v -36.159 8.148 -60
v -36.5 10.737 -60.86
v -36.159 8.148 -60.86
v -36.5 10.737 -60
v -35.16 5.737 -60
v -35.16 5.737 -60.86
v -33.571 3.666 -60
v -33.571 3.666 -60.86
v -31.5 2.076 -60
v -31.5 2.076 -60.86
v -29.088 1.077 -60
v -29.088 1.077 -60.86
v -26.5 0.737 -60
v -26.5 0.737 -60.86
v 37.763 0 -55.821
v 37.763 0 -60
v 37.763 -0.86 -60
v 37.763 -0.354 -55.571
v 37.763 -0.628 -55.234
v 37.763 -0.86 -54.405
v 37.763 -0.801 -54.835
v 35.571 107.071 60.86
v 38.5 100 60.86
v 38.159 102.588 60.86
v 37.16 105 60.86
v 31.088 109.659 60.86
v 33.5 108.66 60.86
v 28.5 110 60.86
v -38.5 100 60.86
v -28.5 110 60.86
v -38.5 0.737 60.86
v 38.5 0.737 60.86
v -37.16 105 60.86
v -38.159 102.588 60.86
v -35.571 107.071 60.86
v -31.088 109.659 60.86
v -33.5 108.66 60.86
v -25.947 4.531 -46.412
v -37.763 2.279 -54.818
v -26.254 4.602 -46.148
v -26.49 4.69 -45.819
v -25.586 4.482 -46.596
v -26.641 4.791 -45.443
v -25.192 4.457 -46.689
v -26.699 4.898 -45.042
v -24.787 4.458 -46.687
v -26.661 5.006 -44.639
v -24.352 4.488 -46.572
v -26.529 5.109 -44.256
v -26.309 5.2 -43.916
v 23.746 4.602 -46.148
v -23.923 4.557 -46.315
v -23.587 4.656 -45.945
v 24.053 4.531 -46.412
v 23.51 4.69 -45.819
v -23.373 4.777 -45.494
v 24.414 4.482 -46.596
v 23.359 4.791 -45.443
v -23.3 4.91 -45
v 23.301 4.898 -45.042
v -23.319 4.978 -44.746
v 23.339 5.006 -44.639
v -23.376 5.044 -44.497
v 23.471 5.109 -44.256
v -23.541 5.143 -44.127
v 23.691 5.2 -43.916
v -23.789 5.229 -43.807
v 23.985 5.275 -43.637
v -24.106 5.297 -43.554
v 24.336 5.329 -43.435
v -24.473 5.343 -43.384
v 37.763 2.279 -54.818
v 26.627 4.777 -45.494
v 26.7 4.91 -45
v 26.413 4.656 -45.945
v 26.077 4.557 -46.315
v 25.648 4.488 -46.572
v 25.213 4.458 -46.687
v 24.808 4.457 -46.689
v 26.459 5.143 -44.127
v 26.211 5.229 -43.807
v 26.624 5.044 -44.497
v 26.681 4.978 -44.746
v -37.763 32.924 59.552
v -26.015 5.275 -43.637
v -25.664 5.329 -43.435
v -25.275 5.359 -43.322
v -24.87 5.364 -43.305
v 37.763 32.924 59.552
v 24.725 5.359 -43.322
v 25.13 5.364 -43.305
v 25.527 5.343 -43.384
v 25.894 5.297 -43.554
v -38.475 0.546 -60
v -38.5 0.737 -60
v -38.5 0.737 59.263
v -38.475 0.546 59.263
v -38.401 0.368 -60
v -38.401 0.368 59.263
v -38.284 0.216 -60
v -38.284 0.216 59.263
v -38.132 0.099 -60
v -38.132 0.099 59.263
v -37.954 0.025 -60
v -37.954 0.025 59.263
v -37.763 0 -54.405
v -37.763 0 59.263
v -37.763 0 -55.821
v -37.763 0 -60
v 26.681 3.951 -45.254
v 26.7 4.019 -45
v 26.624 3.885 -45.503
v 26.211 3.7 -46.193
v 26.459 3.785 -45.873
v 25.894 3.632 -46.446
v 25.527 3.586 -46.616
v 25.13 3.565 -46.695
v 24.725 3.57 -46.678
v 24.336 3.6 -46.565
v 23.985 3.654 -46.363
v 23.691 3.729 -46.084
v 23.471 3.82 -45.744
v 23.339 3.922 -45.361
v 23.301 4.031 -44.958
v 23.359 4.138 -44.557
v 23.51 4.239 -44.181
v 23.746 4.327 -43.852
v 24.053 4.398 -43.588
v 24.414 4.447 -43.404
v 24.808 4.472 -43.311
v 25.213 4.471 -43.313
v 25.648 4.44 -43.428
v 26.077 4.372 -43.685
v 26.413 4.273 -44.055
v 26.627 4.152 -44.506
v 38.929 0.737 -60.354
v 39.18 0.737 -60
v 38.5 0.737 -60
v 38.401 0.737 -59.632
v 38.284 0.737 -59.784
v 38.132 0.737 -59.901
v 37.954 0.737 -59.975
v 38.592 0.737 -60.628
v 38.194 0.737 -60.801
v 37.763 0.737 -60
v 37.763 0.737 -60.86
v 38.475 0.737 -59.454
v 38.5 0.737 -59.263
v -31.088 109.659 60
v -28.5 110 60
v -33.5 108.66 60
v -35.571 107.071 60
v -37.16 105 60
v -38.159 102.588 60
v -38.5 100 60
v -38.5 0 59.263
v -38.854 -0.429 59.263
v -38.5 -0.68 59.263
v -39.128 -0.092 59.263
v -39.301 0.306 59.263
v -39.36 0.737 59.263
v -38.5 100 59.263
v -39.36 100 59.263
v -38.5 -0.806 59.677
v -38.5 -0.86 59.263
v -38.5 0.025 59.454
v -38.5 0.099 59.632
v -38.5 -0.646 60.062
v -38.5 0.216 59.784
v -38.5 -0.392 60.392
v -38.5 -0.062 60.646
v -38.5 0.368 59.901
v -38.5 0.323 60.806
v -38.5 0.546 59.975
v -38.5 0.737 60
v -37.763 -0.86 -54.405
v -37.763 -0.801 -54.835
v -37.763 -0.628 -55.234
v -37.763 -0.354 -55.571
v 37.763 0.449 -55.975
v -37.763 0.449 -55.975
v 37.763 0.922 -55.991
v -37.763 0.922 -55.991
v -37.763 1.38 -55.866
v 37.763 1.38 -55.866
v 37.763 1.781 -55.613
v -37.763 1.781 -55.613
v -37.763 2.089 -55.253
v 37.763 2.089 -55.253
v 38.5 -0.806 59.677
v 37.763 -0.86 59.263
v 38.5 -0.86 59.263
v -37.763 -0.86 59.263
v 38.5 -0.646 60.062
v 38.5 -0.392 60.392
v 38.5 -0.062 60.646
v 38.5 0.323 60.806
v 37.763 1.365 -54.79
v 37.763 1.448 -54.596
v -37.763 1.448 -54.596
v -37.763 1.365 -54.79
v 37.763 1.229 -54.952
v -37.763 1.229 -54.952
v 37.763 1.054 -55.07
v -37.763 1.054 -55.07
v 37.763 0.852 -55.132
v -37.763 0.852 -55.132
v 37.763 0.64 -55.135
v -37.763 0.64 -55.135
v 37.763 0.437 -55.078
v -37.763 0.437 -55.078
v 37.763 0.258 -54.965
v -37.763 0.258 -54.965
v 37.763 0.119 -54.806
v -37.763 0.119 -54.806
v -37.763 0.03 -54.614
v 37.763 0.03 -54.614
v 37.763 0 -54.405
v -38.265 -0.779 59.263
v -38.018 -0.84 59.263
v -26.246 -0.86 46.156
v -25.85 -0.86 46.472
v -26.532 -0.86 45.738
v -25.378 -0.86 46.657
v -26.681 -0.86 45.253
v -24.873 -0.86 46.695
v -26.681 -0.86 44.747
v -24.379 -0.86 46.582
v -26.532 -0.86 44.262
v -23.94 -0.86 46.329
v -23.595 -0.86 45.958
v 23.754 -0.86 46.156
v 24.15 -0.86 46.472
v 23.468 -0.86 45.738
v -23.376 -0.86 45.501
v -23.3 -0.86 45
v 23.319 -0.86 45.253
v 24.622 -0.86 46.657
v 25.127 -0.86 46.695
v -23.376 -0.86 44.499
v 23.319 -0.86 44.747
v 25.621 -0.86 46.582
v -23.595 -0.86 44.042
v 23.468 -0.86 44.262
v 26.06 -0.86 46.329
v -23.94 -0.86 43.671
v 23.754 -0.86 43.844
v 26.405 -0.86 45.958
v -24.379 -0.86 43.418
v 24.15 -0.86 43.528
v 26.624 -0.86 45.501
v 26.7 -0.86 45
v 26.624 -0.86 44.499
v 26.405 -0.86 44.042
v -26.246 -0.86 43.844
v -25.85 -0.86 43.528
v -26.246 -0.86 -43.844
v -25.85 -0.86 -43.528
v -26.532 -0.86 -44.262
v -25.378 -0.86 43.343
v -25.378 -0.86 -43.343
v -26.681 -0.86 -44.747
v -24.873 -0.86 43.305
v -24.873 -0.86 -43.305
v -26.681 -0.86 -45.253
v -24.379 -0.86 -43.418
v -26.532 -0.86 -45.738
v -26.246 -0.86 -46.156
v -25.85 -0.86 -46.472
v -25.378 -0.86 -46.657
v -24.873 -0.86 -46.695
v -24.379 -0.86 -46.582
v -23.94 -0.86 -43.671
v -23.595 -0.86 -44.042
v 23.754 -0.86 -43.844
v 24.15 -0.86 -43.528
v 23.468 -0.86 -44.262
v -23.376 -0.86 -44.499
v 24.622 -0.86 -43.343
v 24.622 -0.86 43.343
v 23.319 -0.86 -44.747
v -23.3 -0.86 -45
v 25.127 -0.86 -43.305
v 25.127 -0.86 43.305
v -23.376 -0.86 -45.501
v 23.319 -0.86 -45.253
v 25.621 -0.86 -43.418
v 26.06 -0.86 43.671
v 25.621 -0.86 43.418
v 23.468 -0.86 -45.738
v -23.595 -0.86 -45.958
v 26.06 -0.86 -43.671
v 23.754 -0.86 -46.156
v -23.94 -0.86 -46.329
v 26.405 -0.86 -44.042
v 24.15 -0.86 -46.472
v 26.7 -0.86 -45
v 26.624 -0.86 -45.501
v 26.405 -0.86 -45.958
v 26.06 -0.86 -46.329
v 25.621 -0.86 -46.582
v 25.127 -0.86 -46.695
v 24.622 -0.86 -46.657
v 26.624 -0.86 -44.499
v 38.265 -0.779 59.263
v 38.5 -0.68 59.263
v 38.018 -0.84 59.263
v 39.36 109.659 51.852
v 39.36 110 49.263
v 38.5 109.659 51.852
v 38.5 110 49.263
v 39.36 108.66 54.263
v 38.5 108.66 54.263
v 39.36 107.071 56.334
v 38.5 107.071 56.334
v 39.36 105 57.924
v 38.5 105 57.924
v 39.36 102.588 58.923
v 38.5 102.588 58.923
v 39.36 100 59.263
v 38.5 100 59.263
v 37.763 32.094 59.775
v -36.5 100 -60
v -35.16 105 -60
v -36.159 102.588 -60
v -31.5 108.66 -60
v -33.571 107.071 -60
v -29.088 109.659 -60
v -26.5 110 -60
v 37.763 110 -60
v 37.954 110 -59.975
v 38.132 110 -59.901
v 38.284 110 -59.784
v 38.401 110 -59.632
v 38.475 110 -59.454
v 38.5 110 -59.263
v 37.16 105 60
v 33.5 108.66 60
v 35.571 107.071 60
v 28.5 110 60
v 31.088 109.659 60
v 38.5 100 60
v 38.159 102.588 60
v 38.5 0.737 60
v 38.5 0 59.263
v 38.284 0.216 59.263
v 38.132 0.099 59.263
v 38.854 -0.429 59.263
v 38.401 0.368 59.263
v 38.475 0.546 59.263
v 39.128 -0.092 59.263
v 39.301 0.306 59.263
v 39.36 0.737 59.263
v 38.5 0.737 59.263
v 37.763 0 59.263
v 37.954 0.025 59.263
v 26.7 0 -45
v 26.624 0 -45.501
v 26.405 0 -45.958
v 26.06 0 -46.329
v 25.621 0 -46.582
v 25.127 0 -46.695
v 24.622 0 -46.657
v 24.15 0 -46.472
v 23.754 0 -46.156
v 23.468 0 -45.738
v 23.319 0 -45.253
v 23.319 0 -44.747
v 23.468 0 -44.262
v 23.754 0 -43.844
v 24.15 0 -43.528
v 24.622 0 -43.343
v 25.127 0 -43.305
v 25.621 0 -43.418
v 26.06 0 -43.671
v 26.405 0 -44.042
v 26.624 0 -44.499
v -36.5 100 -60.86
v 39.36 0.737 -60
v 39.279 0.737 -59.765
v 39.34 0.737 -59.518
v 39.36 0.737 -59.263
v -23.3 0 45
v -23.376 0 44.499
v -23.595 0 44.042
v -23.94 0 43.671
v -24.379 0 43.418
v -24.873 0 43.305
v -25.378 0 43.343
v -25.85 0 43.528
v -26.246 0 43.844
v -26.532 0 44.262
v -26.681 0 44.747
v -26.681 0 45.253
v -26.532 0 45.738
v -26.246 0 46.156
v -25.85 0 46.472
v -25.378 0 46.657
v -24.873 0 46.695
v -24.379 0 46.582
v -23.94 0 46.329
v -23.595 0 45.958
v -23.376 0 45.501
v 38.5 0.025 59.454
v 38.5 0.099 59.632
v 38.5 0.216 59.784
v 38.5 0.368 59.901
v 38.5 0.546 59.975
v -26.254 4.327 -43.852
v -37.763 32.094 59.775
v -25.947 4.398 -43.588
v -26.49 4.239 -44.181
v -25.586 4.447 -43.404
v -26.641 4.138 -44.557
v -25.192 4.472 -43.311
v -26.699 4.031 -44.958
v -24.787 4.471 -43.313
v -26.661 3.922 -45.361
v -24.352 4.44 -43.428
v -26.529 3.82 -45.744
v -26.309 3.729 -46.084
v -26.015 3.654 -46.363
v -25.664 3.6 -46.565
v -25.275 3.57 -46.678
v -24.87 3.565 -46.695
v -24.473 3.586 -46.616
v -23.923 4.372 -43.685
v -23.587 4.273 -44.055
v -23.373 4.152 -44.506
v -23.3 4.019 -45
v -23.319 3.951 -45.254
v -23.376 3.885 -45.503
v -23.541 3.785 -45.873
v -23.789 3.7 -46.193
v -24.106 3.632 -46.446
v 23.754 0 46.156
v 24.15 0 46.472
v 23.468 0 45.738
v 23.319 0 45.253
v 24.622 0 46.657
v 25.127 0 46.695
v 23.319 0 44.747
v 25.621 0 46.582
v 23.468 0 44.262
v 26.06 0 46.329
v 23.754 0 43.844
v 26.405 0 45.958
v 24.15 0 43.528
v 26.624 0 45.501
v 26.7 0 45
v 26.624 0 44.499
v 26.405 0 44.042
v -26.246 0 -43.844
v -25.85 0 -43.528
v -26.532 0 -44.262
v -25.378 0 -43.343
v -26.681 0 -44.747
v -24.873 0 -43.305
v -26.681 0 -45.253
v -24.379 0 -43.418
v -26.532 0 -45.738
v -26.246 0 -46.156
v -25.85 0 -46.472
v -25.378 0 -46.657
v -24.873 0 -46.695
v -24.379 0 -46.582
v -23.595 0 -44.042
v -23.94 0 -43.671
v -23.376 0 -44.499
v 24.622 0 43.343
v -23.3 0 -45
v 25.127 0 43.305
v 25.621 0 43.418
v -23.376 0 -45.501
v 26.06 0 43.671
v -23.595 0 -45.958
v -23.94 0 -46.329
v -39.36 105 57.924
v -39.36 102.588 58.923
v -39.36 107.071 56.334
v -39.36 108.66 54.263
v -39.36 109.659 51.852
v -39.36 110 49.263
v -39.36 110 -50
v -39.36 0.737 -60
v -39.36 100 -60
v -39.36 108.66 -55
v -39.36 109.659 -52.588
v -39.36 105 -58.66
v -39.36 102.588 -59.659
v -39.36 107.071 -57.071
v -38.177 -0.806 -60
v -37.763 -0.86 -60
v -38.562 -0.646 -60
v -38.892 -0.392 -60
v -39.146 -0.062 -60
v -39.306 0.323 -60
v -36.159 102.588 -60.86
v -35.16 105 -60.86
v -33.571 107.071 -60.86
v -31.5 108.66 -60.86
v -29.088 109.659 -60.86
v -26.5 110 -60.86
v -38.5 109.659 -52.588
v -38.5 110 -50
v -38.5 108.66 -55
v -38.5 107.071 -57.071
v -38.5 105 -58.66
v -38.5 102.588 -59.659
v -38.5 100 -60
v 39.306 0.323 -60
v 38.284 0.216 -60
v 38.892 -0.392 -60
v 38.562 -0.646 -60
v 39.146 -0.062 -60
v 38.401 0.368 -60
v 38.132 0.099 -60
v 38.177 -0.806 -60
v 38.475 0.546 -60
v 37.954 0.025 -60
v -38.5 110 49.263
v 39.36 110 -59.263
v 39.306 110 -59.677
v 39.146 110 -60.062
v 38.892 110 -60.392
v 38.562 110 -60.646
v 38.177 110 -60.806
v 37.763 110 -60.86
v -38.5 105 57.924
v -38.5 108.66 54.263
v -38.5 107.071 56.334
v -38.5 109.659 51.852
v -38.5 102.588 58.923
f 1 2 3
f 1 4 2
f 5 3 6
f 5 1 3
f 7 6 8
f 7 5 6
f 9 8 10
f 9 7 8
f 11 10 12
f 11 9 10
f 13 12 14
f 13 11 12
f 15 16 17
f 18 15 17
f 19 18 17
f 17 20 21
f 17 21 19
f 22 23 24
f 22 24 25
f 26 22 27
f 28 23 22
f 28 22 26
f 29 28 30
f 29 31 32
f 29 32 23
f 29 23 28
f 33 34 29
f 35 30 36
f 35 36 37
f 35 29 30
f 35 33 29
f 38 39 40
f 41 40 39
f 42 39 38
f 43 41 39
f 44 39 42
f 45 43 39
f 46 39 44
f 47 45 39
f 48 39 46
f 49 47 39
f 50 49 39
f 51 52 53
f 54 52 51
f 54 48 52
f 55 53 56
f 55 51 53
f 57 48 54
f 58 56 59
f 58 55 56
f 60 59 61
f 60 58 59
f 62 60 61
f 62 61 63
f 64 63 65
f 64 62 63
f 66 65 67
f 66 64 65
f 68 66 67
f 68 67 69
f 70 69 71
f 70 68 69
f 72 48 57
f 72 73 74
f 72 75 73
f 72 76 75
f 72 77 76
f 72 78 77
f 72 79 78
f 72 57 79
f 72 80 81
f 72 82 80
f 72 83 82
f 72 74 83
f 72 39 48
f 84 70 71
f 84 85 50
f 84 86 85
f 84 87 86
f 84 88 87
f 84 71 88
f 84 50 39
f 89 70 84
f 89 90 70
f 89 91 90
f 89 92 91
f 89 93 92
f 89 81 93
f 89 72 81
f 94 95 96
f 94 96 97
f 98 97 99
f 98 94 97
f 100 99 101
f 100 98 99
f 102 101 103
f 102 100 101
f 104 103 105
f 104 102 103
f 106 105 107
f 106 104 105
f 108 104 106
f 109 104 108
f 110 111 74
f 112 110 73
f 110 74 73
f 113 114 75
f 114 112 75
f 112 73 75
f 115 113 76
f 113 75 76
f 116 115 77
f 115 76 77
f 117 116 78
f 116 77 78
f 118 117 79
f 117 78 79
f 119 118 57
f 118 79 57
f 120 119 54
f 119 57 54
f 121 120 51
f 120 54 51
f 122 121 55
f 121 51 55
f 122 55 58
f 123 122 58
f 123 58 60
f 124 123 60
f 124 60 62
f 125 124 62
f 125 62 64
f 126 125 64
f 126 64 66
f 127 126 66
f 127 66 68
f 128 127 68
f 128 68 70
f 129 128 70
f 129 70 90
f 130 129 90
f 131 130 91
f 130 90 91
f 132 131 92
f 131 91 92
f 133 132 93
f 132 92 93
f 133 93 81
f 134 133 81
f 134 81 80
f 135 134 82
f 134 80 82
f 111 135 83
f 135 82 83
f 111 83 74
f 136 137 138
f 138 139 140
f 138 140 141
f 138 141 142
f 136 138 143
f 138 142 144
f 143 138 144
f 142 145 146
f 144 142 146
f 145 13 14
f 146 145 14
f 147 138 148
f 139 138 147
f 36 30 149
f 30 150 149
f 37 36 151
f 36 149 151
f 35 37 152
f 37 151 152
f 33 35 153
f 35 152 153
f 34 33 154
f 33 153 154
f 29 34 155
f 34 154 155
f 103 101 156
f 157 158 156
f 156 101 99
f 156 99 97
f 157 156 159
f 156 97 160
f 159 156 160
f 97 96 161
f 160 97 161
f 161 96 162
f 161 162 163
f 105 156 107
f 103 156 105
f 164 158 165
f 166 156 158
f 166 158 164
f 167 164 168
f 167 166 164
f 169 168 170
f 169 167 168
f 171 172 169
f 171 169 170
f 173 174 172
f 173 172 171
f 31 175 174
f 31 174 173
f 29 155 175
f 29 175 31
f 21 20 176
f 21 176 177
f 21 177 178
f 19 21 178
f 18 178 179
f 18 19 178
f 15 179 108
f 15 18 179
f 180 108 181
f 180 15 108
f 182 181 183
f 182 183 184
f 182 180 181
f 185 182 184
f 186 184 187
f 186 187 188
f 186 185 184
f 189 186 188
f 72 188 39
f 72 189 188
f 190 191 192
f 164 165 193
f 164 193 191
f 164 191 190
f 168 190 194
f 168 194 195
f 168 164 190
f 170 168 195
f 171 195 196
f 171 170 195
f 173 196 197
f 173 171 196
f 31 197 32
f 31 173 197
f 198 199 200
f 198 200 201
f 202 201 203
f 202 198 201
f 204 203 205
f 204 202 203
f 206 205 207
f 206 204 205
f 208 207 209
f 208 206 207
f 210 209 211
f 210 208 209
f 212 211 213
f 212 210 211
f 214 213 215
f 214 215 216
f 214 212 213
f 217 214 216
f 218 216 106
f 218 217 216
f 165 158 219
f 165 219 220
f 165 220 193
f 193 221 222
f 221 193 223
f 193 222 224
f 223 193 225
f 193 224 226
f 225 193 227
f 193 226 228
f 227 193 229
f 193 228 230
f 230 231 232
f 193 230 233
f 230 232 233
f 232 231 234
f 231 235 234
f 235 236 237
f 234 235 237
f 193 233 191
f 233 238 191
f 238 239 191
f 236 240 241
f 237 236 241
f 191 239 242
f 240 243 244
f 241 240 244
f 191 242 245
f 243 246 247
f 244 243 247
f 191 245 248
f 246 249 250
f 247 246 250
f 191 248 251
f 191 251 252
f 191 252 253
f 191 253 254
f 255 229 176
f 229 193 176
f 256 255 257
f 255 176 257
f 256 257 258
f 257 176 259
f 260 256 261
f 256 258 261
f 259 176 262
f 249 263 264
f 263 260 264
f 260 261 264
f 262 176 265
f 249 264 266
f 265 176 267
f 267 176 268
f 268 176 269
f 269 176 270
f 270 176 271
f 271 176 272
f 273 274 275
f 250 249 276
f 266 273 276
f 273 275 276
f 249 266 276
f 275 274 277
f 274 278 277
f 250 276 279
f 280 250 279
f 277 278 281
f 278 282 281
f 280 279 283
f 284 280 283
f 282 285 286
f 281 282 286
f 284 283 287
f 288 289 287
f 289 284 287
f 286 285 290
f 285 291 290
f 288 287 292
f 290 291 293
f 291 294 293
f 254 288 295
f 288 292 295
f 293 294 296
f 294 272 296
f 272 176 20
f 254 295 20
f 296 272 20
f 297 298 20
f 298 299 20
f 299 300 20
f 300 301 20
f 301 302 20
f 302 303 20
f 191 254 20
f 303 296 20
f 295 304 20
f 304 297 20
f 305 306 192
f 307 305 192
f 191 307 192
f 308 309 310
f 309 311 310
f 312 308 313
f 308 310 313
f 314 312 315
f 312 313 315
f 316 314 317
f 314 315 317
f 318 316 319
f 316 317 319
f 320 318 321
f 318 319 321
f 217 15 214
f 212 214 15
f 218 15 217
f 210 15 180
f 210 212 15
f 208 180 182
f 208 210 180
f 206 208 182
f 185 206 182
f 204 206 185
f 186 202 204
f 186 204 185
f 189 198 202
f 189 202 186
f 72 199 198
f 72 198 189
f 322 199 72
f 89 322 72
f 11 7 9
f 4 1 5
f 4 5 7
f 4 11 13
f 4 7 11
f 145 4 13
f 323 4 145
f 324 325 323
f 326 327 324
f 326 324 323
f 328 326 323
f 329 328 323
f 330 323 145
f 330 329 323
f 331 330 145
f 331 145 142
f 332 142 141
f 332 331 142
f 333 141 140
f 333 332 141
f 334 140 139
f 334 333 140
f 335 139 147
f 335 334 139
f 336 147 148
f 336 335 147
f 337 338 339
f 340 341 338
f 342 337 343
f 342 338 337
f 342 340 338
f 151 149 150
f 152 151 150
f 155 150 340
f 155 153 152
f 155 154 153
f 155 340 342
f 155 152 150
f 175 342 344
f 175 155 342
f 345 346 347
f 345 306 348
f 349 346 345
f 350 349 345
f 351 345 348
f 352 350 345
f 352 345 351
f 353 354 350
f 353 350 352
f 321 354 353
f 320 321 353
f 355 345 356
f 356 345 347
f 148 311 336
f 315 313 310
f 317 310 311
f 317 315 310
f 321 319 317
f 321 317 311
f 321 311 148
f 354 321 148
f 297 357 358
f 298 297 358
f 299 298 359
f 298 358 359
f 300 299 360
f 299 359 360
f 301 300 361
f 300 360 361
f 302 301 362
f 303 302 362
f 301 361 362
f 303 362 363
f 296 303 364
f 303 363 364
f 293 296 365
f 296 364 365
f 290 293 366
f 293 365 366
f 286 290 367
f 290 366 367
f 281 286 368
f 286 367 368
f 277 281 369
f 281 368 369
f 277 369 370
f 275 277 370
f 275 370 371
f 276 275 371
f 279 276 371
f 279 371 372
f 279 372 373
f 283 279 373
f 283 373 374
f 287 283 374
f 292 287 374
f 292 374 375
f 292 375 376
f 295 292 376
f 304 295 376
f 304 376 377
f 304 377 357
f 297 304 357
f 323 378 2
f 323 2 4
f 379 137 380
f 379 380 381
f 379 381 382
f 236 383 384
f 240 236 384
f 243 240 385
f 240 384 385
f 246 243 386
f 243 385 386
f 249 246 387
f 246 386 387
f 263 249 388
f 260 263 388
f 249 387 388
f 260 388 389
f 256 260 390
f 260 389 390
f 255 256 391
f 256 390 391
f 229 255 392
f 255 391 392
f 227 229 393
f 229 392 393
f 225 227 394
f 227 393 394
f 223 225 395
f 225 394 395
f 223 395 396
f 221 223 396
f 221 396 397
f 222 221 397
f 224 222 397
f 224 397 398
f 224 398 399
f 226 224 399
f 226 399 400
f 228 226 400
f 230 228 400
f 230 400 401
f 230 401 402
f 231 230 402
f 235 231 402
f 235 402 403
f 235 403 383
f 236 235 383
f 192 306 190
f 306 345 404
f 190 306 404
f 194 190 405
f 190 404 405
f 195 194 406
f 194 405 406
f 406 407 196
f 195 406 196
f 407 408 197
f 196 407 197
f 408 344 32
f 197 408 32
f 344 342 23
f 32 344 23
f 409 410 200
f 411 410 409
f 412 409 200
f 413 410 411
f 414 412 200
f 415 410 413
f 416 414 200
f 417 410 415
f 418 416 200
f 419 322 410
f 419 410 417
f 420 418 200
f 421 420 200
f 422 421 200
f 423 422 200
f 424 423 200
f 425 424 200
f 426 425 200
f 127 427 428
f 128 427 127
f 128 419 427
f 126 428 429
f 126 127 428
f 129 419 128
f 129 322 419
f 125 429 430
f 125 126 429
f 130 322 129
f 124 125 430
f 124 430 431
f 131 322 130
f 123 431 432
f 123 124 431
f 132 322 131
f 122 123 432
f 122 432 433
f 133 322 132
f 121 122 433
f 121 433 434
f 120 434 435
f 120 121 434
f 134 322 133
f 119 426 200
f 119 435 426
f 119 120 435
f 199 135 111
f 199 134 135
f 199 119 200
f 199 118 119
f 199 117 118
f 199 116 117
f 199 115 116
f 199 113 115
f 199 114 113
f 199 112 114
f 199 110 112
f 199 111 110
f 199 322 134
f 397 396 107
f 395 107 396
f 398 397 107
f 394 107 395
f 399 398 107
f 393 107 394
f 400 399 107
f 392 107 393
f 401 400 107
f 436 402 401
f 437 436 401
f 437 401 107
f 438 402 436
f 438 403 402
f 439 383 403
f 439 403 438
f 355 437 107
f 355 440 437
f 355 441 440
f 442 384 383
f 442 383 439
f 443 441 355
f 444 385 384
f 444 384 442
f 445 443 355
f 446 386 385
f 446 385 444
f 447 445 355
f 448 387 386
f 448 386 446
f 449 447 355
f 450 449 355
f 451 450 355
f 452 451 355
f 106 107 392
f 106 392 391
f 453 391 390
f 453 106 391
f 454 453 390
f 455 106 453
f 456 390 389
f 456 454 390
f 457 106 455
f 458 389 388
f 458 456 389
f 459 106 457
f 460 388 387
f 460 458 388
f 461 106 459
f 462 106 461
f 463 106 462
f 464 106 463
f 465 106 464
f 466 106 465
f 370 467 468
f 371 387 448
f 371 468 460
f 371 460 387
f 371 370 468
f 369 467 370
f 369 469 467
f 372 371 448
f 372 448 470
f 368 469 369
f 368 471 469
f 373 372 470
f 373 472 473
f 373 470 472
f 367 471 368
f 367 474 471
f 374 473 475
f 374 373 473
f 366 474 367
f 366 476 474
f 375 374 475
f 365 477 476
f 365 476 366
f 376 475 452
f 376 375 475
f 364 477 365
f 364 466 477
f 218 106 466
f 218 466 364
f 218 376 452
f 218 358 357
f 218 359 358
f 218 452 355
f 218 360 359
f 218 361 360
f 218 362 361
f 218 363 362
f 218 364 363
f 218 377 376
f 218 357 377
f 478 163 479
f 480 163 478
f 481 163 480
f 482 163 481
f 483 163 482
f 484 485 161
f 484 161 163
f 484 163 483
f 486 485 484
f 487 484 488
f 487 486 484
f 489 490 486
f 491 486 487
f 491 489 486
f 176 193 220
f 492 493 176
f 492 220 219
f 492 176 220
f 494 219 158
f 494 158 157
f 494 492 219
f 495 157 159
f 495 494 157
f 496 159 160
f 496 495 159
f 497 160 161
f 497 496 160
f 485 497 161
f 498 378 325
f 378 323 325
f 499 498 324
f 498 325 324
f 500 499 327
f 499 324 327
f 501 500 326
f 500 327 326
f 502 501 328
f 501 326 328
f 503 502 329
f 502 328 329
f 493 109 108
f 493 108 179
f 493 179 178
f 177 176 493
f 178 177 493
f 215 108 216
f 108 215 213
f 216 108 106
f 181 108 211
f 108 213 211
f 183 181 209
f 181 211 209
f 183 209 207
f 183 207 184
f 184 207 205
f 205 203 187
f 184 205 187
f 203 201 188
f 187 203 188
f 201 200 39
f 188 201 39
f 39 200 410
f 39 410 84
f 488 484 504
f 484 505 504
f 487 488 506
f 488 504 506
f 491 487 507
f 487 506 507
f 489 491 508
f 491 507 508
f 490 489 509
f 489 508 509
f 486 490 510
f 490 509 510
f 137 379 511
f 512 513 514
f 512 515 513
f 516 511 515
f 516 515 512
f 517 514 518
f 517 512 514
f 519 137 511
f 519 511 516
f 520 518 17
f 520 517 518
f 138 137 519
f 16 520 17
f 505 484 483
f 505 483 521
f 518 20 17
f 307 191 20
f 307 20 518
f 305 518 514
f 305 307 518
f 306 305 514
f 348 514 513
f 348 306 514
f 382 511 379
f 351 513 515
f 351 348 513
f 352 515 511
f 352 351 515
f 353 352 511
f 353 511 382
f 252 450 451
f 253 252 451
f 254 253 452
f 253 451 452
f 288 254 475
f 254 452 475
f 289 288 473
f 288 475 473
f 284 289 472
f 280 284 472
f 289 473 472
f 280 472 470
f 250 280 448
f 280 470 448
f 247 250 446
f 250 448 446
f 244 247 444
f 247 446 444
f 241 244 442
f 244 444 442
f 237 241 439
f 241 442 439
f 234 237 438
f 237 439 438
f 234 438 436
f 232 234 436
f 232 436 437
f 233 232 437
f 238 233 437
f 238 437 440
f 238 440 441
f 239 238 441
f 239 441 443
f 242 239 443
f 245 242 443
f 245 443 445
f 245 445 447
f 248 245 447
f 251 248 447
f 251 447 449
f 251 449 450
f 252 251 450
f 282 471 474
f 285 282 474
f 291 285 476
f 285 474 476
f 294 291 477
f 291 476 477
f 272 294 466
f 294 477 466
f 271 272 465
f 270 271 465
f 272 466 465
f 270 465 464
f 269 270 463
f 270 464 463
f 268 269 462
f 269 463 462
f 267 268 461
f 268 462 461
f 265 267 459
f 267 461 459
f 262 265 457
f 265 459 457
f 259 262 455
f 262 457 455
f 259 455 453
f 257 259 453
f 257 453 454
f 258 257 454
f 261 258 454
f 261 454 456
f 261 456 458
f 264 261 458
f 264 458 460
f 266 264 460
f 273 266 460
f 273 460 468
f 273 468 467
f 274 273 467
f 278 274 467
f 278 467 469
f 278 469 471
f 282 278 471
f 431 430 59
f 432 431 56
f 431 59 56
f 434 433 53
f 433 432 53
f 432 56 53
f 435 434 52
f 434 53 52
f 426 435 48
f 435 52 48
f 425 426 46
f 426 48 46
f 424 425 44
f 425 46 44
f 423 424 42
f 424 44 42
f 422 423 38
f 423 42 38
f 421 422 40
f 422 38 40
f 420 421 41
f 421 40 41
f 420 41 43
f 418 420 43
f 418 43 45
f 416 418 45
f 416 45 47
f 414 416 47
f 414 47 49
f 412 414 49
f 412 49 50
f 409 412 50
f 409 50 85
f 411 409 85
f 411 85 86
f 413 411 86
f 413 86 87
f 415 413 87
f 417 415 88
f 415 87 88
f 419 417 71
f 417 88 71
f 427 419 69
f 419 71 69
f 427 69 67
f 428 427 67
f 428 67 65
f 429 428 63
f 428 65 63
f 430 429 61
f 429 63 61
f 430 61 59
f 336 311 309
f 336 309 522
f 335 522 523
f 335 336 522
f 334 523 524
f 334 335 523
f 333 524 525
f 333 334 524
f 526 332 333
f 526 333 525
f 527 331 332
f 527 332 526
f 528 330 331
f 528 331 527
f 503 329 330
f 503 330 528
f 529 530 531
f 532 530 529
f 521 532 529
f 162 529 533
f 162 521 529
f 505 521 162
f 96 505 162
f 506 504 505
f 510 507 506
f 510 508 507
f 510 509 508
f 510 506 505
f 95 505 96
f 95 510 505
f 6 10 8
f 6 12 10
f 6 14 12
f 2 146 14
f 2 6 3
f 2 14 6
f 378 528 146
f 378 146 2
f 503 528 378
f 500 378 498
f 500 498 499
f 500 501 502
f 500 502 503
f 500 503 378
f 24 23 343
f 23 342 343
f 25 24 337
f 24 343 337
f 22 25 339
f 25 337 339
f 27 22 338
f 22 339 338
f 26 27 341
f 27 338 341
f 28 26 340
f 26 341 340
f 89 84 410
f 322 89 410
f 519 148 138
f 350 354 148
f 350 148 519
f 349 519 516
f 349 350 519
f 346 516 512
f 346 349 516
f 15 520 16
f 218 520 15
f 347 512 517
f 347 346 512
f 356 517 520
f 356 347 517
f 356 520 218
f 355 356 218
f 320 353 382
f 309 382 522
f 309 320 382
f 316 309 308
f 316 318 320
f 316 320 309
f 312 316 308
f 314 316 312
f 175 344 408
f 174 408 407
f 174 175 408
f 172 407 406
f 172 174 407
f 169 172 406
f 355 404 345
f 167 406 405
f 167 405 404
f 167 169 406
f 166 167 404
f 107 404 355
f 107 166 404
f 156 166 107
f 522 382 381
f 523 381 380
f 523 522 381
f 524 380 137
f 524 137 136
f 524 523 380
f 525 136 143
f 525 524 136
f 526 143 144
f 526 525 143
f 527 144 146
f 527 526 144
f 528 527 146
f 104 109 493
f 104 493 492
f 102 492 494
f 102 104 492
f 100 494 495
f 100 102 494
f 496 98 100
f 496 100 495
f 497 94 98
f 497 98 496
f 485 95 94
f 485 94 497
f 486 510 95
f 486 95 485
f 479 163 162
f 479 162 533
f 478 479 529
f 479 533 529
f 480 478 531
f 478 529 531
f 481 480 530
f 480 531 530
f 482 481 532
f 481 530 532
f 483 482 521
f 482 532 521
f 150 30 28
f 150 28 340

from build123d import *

# Parameters (mm, degrees)
SKETCH1_W                    = 77
SKETCH1_H                    = 120
BASE_FLANGE1_DEPTH           = 0.86
EDGE_FLANGE1_STRIP_W         = 4.9132
EDGE_FLANGE1_STRIP_H         = 0.86
EDGE_FLANGE1_STRIP_CUT_DEPTH = 77
EDGE_FLANGE1_DEPTH           = 77
EDGE_FLANGE2_STRIP_W         = 4.9132
EDGE_FLANGE2_STRIP_H         = 0.86
EDGE_FLANGE2_STRIP_CUT_DEPTH = 119.2634
EDGE_FLANGE2_DEPTH           = 119.2634
EDGE_FLANGE3_STRIP_W         = 4.9132
EDGE_FLANGE3_STRIP_H         = 0.86
EDGE_FLANGE3_STRIP_CUT_DEPTH = 119.2634
EDGE_FLANGE3_DEPTH           = 119.2634
EDGE_FLANGE4_STRIP_CUT_DEPTH = 75.5268
EDGE_FLANGE4_DEPTH           = 75.5268
EDGE_FLANGE8_STRIP_W         = 4.9132
EDGE_FLANGE8_STRIP_H         = 0.86
EDGE_FLANGE8_STRIP_CUT_DEPTH = 109.2634
EDGE_FLANGE8_DEPTH           = 109.2634
M3_CLEARANCE_HOLE3_D         = 3.4
M3_CLEARANCE_HOLE3_DEPTH     = 25.4
M3_CLEARANCE_HOLE3_TIP       = 1.021463052
FILLET1_R                    = 10


# Sheet-metal steps are written as plain solids
with BuildPart() as part:
    # Sketch1 → Base-Flange1 (new body)
    with BuildSketch(Plane(origin=(0, 0, 0), x_dir=(1, 0, 0), z_dir=(0, 1, 0))):
        Rectangle(SKETCH1_W, SKETCH1_H)
    extrude(amount=-BASE_FLANGE1_DEPTH)

    # Edge-Flange1 strip (across the edge) → Edge-Flange1 strip cut (cut)
    with BuildSketch(Plane(origin=(-38.5, 0, 60), x_dir=(0, 0, -1), z_dir=(1, 0, 0))):
        with Locations((-1.72, -0.43)):
            Rectangle(EDGE_FLANGE1_STRIP_W, EDGE_FLANGE1_STRIP_H)
    extrude(amount=EDGE_FLANGE1_STRIP_CUT_DEPTH, mode=Mode.SUBTRACT)

    # Edge-Flange1 section (across the edge) → Edge-Flange1 (add)
    with BuildSketch(Plane(origin=(-38.5, 0, 60), x_dir=(0, 0, -1), z_dir=(1, 0, 0))):
        with BuildLine():
            Line((-0.86, 0.7366), (-0.86, 110))
            Line((-0.86, 110), (0, 110))
            Line((0, 110), (0, 0.7366))
            ThreePointArc((0, 0.7366), (0.215745145, 0.215745145), (0.7366, 0))
            Line((0.7366, 0), (0.7366, -0.86))
            ThreePointArc((0.7366, -0.86), (-0.392366687, -0.392366687), (-0.86, 0.7366))
        make_face()
    extrude(amount=EDGE_FLANGE1_DEPTH)

    # Edge-Flange2 strip (across the edge) → Edge-Flange2 strip cut (cut)
    with BuildSketch(Plane(origin=(38.5, 0, 59.2634), x_dir=(-1, 0, 0), z_dir=(0, 0, -1))):
        with Locations((-1.72, -0.43)):
            Rectangle(EDGE_FLANGE2_STRIP_W, EDGE_FLANGE2_STRIP_H)
    extrude(amount=EDGE_FLANGE2_STRIP_CUT_DEPTH, mode=Mode.SUBTRACT)

    # Edge-Flange2 section (across the edge) → Edge-Flange2 (add)
    with BuildSketch(Plane(origin=(38.5, 0, 59.2634), x_dir=(-1, 0, 0), z_dir=(0, 0, -1))):
        with BuildLine():
            Line((-0.86, 0.7366), (-0.86, 110))
            Line((-0.86, 110), (0, 110))
            Line((0, 110), (0, 0.7366))
            ThreePointArc((0, 0.7366), (0.215745145, 0.215745145), (0.7366, 0))
            Line((0.7366, 0), (0.7366, -0.86))
            ThreePointArc((0.7366, -0.86), (-0.392366687, -0.392366687), (-0.86, 0.7366))
        make_face()
    extrude(amount=EDGE_FLANGE2_DEPTH)

    # Edge-Flange3 strip (across the edge) → Edge-Flange3 strip cut (cut)
    with BuildSketch(Plane(origin=(-38.5, 0, -60), x_dir=(1, 0, 0), z_dir=(0, 0, 1))):
        with Locations((-1.72, -0.43)):
            Rectangle(EDGE_FLANGE3_STRIP_W, EDGE_FLANGE3_STRIP_H)
    extrude(amount=EDGE_FLANGE3_STRIP_CUT_DEPTH, mode=Mode.SUBTRACT)

    # Edge-Flange3 section (across the edge) → Edge-Flange3 (add)
    with BuildSketch(Plane(origin=(-38.5, 0, -60), x_dir=(1, 0, 0), z_dir=(0, 0, 1))):
        with BuildLine():
            Line((-0.86, 0.7366), (-0.86, 110))
            Line((-0.86, 110), (0, 110))
            Line((0, 110), (0, 0.7366))
            ThreePointArc((0, 0.7366), (0.215745145, 0.215745145), (0.7366, 0))
            Line((0.7366, 0), (0.7366, -0.86))
            ThreePointArc((0.7366, -0.86), (-0.392366687, -0.392366687), (-0.86, 0.7366))
        make_face()
    extrude(amount=EDGE_FLANGE3_DEPTH)

    # Edge-Flange4 strip (across the edge) → Edge-Flange4 strip cut (cut)
    with BuildSketch(Plane(origin=(37.7634, 0, -60), x_dir=(0, -0.9659258262890681, 0.25881904510252135), z_dir=(-1, 0, 0))):
        Polygon((-7.380189595, -30.866027382), (2.278797174, 5.181801992), (1.448100964, 5.404386371), (-8.210885806, -30.643443003), align=None)
    extrude(amount=EDGE_FLANGE4_STRIP_CUT_DEPTH, mode=Mode.SUBTRACT)

    # Edge-Flange4 section (across the edge) → Edge-Flange4 (add)
    with BuildSketch(Plane(origin=(37.7634, 0, -60), x_dir=(0, -0.9659258262890681, 0.25881904510252135), z_dir=(-1, 0, 0))):
        with BuildLine():
            Line((-0.86, 5.595032479), (-0.86, 124))
            Line((-0.86, 124), (0, 124))
            Line((0, 124), (0, 5.595032479))
            ThreePointArc((0, 5.595032479), (0.640454407, 4.864734195), (1.448100964, 5.404386371))
            Line((1.448100964, 5.404386371), (2.278797174, 5.181801992))
            ThreePointArc((2.278797174, 5.181801992), (0.528201882, 4.012091614), (-0.86, 5.595032479))
        make_face()
    extrude(amount=EDGE_FLANGE4_DEPTH)

    # Edge-Flange8 strip (across the edge) → Edge-Flange8 strip cut (cut)
    with BuildSketch(Plane(origin=(38.5, 110, -60), x_dir=(0, 0, 1), z_dir=(0, -1, 0))):
        with Locations((-1.72, -0.43)):
            Rectangle(EDGE_FLANGE8_STRIP_W, EDGE_FLANGE8_STRIP_H)
    extrude(amount=EDGE_FLANGE8_STRIP_CUT_DEPTH, mode=Mode.SUBTRACT)

    # Edge-Flange8 section (across the edge) → Edge-Flange8 (add)
    with BuildSketch(Plane(origin=(38.5, 110, -60), x_dir=(0, 0, 1), z_dir=(0, -1, 0))):
        with BuildLine():
            Line((-0.86, 0.7366), (-0.86, 75))
            Line((-0.86, 75), (0, 75))
            Line((0, 75), (0, 0.7366))
            ThreePointArc((0, 0.7366), (0.215745145, 0.215745145), (0.7366, 0))
            Line((0.7366, 0), (0.7366, -0.86))
            ThreePointArc((0.7366, -0.86), (-0.392366687, -0.392366687), (-0.86, 0.7366))
        make_face()
    extrude(amount=EDGE_FLANGE8_DEPTH)

    # M3 Clearance Hole3
    with Locations(Plane(origin=(0, -0.86, 0), x_dir=(-1, 0, 0), z_dir=(0, -1, 0))):
        with Locations((-25, 45), (25, 45), (25, -45), (-25, -45)):
            Hole(M3_CLEARANCE_HOLE3_D / 2, depth=M3_CLEARANCE_HOLE3_DEPTH)
            with Locations((0, 0, -(M3_CLEARANCE_HOLE3_DEPTH + M3_CLEARANCE_HOLE3_TIP / 2))):  # 118° drill point
                Cone(0, M3_CLEARANCE_HOLE3_D / 2, M3_CLEARANCE_HOLE3_TIP, mode=Mode.SUBTRACT)

    # Fillet1
    fillet1_edges = [part.edges().sort_by_distance(p)[0] for p in [
        (-36.5, 0.7366, -60.43),
        (-36.5, 110, -60.43),
        (-38.93, 110, -60),
        (-38.93, 110, 59.2634),
        (38.93, 110, 59.2634),
        (38.5, 110, 60.43),
        (-38.5, 110, 60.43),
    ]]
    fillet(fillet1_edges, radius=FILLET1_R)


solid = part.part
